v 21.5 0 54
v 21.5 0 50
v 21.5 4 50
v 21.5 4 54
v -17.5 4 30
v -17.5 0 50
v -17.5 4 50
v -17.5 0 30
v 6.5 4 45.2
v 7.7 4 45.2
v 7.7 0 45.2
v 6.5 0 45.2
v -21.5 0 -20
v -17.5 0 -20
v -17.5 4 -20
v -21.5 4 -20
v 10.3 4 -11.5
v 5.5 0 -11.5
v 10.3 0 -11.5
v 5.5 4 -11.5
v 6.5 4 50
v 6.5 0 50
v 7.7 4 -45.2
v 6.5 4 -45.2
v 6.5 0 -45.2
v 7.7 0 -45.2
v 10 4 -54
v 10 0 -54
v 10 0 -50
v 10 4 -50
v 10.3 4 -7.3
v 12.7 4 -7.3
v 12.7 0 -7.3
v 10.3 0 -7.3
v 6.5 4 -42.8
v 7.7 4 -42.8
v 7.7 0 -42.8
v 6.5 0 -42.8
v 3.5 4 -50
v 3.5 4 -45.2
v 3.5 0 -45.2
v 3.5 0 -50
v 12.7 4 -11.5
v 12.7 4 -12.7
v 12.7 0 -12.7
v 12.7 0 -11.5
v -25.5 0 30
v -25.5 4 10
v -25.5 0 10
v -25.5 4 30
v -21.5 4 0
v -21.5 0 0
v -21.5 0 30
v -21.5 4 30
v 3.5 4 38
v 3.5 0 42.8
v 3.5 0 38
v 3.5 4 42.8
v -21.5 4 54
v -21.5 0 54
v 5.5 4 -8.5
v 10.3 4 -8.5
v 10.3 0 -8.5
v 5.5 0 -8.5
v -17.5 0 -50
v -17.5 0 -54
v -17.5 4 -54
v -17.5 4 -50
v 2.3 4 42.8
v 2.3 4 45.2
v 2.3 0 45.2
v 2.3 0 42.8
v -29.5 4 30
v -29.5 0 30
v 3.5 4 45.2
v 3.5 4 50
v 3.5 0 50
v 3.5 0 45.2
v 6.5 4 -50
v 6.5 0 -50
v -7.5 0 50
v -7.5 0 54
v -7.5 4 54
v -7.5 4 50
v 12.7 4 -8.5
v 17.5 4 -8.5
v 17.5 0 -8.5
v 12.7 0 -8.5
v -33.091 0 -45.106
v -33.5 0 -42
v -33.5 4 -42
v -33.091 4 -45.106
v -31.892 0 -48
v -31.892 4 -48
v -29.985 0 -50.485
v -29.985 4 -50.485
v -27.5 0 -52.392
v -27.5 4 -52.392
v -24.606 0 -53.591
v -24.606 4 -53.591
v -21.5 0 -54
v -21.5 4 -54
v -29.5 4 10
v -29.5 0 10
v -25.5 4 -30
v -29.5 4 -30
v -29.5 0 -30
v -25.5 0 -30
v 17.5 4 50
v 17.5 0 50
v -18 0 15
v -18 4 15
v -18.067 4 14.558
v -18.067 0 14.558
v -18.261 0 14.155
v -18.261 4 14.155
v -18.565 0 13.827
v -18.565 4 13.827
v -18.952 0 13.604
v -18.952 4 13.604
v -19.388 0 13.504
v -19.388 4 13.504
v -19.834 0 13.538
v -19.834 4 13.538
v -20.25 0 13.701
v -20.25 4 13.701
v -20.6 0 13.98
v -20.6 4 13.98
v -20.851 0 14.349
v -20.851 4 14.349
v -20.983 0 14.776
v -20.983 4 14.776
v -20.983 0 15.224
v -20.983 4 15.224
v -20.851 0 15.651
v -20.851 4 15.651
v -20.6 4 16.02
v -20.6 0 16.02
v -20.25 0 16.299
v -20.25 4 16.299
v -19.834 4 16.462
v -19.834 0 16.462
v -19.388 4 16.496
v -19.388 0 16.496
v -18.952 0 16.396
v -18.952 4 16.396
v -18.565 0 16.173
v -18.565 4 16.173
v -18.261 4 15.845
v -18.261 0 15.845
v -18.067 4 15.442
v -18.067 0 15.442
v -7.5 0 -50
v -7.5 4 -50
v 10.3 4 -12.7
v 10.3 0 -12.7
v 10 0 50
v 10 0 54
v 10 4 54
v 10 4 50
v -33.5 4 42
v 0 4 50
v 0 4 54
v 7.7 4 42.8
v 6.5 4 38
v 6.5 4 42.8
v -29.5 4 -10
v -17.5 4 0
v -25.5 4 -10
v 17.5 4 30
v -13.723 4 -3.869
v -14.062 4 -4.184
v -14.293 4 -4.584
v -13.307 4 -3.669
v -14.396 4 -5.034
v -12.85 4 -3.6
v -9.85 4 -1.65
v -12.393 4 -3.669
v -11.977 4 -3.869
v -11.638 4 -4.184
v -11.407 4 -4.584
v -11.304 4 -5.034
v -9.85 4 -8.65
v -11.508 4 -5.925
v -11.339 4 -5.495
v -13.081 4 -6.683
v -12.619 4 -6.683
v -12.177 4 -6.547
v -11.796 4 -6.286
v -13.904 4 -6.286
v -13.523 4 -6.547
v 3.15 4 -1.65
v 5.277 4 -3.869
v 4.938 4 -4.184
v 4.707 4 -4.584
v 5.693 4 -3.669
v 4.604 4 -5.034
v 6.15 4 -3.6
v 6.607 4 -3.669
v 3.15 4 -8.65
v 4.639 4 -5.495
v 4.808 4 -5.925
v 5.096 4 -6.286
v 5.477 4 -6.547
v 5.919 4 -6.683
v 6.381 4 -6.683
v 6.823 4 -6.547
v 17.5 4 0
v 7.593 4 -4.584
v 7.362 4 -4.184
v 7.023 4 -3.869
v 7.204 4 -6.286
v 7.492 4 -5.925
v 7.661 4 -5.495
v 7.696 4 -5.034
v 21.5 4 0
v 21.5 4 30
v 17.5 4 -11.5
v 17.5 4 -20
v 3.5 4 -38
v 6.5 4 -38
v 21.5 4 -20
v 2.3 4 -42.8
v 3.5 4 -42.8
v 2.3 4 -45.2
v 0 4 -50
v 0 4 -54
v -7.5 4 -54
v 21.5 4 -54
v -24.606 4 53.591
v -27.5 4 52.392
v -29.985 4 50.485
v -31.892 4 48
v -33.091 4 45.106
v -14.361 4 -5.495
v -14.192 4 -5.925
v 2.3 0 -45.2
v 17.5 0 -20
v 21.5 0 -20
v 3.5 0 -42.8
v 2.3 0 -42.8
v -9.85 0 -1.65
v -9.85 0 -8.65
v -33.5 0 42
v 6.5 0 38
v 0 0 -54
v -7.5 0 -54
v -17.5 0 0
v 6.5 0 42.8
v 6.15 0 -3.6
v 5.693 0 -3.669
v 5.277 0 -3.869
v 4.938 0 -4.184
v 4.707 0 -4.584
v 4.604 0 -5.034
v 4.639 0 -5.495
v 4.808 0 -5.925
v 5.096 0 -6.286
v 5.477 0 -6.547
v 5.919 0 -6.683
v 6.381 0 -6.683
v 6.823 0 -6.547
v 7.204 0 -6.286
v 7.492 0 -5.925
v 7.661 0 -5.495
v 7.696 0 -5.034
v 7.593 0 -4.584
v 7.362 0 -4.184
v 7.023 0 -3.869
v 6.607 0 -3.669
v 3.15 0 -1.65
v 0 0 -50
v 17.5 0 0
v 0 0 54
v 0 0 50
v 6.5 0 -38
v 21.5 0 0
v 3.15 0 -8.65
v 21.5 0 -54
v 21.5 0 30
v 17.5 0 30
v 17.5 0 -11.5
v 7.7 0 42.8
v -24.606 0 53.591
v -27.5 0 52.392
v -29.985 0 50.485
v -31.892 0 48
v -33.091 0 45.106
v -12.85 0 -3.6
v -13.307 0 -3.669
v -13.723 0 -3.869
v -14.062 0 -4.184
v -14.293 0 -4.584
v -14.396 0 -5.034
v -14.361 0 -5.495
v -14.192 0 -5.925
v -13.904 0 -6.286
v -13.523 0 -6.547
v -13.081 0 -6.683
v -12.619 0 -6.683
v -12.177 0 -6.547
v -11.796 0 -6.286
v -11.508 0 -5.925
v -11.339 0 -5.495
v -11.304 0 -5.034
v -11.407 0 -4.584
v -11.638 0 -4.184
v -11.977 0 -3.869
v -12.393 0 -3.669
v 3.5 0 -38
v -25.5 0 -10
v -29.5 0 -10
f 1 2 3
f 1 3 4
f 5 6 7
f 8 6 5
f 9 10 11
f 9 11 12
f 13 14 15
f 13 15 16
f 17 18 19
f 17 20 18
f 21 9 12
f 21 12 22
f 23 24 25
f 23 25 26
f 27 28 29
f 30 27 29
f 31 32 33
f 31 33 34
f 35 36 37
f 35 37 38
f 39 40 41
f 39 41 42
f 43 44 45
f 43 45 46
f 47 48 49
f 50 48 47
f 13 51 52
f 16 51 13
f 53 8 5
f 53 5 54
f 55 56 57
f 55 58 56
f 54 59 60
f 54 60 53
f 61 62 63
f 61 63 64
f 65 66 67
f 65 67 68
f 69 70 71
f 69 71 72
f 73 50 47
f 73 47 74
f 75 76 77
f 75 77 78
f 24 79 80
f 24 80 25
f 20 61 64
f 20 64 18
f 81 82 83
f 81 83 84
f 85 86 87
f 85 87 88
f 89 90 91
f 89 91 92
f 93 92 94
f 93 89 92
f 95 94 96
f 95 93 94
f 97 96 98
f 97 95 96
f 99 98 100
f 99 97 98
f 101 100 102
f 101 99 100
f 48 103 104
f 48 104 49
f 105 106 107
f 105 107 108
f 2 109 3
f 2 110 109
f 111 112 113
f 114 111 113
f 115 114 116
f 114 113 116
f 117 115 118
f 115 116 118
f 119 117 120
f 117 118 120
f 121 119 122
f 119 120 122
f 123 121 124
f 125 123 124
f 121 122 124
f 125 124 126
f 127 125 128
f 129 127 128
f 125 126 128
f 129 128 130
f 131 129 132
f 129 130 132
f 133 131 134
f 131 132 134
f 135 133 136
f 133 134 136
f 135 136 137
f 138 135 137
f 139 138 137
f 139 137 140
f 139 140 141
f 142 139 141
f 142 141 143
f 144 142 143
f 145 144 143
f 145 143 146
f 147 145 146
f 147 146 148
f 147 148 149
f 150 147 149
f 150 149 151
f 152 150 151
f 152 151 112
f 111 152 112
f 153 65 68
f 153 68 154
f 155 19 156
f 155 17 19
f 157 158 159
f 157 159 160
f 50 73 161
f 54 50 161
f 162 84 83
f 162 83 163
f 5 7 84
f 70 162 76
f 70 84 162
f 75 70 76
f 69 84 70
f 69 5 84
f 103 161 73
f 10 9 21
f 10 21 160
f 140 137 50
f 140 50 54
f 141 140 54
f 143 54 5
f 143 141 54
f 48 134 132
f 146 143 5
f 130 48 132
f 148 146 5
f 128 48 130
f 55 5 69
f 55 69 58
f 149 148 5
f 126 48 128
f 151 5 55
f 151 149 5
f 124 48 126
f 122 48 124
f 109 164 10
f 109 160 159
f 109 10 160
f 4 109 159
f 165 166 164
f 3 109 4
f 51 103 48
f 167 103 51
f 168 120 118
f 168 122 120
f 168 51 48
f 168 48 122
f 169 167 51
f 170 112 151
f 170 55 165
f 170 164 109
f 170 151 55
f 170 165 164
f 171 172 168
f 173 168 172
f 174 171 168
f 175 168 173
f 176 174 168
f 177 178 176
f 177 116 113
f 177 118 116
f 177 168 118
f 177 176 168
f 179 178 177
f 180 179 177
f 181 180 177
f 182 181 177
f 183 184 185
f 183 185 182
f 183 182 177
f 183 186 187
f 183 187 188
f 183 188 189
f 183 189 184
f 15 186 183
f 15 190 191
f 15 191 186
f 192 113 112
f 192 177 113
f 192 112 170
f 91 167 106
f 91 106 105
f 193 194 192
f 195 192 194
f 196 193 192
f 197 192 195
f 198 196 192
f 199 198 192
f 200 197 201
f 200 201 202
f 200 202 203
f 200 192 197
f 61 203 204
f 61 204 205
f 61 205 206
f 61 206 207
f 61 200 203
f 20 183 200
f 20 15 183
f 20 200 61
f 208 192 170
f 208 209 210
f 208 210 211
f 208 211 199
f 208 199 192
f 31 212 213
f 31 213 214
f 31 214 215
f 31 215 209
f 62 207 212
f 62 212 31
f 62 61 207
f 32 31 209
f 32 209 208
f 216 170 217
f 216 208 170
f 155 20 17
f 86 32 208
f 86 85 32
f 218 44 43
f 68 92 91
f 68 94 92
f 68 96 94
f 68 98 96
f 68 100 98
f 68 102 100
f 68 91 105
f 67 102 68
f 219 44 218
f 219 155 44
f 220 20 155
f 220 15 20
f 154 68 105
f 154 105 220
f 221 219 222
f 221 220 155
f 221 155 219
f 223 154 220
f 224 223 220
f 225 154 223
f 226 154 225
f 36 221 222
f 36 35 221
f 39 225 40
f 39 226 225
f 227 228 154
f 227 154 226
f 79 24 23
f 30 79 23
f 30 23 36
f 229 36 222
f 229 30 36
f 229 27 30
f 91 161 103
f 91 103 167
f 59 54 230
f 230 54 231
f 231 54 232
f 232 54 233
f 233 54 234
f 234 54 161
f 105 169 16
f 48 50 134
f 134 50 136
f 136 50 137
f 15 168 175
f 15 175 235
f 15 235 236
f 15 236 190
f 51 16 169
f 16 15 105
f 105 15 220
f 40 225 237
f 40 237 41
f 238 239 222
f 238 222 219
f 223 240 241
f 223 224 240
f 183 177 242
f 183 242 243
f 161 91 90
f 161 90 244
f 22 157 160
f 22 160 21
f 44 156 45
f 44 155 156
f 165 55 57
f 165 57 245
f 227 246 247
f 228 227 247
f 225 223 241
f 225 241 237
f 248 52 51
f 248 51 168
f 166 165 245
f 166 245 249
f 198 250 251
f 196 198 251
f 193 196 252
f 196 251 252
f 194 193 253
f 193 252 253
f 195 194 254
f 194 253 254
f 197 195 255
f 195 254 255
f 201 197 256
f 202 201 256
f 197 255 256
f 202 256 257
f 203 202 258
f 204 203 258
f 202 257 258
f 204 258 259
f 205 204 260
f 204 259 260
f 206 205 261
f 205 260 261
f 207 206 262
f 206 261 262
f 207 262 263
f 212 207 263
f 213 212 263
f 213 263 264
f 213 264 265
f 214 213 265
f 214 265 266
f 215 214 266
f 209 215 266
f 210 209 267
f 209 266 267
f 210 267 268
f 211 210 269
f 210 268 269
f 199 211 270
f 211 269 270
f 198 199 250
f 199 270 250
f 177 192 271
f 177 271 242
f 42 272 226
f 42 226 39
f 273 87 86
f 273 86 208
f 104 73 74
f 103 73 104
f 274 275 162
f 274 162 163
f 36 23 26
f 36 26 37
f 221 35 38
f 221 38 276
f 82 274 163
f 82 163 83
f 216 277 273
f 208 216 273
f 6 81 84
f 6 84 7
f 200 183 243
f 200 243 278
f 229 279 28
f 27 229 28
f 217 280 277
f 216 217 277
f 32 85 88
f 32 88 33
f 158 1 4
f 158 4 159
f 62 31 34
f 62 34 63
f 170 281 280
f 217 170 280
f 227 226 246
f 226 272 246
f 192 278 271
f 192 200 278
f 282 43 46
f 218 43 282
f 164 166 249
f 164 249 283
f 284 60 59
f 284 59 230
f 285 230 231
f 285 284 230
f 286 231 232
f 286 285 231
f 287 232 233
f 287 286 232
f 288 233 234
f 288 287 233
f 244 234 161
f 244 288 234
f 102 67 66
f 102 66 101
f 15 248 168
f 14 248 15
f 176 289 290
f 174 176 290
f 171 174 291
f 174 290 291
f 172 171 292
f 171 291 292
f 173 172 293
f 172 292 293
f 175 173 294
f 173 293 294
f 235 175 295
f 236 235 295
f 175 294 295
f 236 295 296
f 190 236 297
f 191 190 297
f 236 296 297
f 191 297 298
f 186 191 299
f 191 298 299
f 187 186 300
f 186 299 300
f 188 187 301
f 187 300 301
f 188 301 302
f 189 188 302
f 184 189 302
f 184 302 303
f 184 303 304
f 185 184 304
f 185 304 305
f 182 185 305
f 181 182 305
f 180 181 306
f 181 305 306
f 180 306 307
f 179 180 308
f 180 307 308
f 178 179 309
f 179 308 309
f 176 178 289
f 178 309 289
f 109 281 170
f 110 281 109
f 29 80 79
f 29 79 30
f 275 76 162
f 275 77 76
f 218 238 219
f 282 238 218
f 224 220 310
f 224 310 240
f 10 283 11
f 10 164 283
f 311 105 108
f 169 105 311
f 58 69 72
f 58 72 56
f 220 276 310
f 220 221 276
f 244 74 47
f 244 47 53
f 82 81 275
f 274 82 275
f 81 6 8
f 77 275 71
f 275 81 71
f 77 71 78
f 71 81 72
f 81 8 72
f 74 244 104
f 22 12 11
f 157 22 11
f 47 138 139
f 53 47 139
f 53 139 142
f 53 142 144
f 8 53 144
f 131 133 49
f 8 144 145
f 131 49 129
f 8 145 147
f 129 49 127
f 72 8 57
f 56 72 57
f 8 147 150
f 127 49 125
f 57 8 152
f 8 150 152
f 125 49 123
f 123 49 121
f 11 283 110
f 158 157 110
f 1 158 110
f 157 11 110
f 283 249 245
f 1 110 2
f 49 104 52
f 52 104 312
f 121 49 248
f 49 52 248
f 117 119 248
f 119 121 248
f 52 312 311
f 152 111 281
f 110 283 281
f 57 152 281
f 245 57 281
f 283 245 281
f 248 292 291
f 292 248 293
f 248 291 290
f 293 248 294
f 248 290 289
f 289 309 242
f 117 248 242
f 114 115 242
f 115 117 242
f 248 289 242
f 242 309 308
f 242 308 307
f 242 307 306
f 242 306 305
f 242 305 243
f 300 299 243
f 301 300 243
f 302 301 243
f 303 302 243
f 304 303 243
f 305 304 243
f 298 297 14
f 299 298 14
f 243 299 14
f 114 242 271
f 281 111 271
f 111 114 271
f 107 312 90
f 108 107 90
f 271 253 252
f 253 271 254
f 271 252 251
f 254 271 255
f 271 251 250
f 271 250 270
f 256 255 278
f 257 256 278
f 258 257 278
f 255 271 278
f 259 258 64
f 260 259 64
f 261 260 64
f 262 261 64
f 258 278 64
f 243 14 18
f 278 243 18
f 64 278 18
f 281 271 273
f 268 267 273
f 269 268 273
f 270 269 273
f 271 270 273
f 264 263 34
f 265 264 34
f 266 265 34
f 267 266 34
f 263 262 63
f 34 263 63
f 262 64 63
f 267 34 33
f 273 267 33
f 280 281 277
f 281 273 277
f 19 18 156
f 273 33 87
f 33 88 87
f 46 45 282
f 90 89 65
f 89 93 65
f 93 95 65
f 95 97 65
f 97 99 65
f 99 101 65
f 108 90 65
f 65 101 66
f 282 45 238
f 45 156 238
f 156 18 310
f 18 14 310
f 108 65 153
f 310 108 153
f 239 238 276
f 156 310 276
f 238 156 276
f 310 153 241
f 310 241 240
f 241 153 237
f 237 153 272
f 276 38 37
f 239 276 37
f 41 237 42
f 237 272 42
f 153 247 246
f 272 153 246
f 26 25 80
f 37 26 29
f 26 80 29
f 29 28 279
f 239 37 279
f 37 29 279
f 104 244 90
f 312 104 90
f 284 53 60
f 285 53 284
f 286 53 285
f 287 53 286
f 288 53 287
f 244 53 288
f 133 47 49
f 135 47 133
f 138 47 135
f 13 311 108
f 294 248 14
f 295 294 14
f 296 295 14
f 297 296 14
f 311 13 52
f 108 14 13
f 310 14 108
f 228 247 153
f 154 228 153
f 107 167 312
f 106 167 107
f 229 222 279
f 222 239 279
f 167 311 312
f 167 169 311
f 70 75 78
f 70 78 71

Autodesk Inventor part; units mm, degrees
ref_plane "YZ Plane" through (0, 0, 0) normal (1, 0, 0) x (0, 1, 0)
ref_plane "XZ Plane" through (0, 0, 0) normal (0, 1, 0) x (-1, 0, 0)
ref_plane "XY Plane" through (0, 0, 0) normal (0, 0, 1) x (1, 0, 0)
sketch "Sketch1" plane through (0, 0, 0) normal (0, 1, 0) x (-1, 0, 0)
  line L0 (-17.5, 50) -> (17.5, 50)
  line L1 (17.5, 50) -> (17.5, -50)
  line L2 (17.5, -50) -> (-17.5, -50)
  line L3 (-17.5, -50) -> (-17.5, 50)
  line L4 (-17.5, 50) -> (17.5, -50) construction
  line L5 (17.5, 50) -> (-17.5, -50) construction
  line L6 (7.5, 50) -> (0, 50)
  line L7 (0, 50) -> (0, 54)
  line L8 (0, 54) -> (7.5, 54)
  line L9 (7.5, 54) -> (7.5, 50)
  line L10 (-10, 50) -> (-21.5, 50)
  line L11 (-21.5, 50) -> (-21.5, 54)
  line L12 (-21.5, 54) -> (-10, 54)
  line L13 (-10, 54) -> (-10, 50)
  line L14 (17.5, 30) -> (21.5, 30)
  line L15 (21.5, 30) -> (21.5, 0)
  line L16 (21.5, 0) -> (17.5, 0)
  line L17 (17.5, 0) -> (17.5, 30)
  line L18 (17.5, -20) -> (21.5, -20)
  line L19 (21.5, -20) -> (21.5, -54)
  line L20 (21.5, -54) -> (17.5, -54)
  line L21 (17.5, -54) -> (17.5, -20)
  line L22 (7.5, -50) -> (0, -50)
  line L23 (0, -50) -> (0, -54)
  line L24 (0, -54) -> (7.5, -54)
  line L25 (7.5, -54) -> (7.5, -50)
  line L26 (-10, -50) -> (-21.5, -50)
  line L27 (-21.5, -50) -> (-21.5, -54)
  line L28 (-21.5, -54) -> (-10, -54)
  line L29 (-10, -54) -> (-10, -50)
  line L30 (-17.5, 30) -> (-21.5, 30)
  line L31 (-21.5, 30) -> (-21.5, 0)
  line L32 (-21.5, 0) -> (-17.5, 0)
  line L33 (-17.5, 0) -> (-17.5, 30)
  line L34 (-17.5, -50) -> (-21.5, -50)
  line L35 (-21.5, -50) -> (-21.5, -20)
  line L36 (-21.5, -20) -> (-17.5, -20)
  line L37 (-17.5, -20) -> (-17.5, -50)
  point P0 (0, 0)
  point P1 (17.5, 0)
  point P2 (-17.5, 0)
  point P3 (-17.5, -20)
  point P4 (-21.5, -50)
  point P5 (0, -50)
  point P6 (17.5, -50)
  dimension "d0" = 35
  dimension "d2" = 7.5
  dimension "d3" = 4
  dimension "d4" = 11.5
  dimension "d5" = 4
  dimension "d6" = 10
  dimension "d7" = 10
  dimension "d8" = 4
  dimension "d9" = 30
  dimension "d10" = 4
  dimension "d11" = 34
  dimension "d12" = 20
  dimension "d13" = 20
  dimension "d14" = 7.5
  dimension "d15" = 4
  dimension "d16" = 11.5
  dimension "d17" = 4
  dimension "d18" = 10
  dimension "d19" = 10
  dimension "d20" = 4
  dimension "d21" = 30
  dimension "d22" = 20
  dimension "d23" = 4
  dimension "d24" = 30
  dimension "d27" = 4
extrude "Extrusion1" add sketch "Sketch1" along normal blind 4
sketch "Sketch2" plane through (0, 4, 0) normal (0, 1, 0) x (1, 0, 0)
  line L0 (-21.5, 54) -> (-33.5, 54)
  line L1 (-33.5, 54) -> (-33.5, -54)
  line L2 (-33.5, -54) -> (-21.5, -54)
  line L3 (-21.5, -54) -> (-21.5, 54)
  line L4 (-7.5, -54) -> (0, -54) projected
  line L5 (-21.5, 54) -> (-21.5, 20) projected
  line L6 (-21.5, 20) -> (-17.5, 20) projected
  line L7 (-17.5, 20) -> (-17.5, 0) projected
  line L8 (-17.5, 0) -> (-21.5, 0) projected
  line L9 (-21.5, 0) -> (-21.5, -30) projected
  line L10 (-21.5, -30) -> (-17.5, -30) projected
  line L11 (-17.5, -30) -> (-17.5, -50) projected
  line L12 (-17.5, -50) -> (-7.5, -50) projected
  line L13 (-7.5, -50) -> (-7.5, -54) projected
  line L14 (-7.5, -54) -> (0, -54) projected
  line L15 (0, -54) -> (0, -50) projected
  line L16 (0, -50) -> (10, -50) projected
  line L17 (10, -50) -> (10, -54) projected
  line L18 (10, -54) -> (21.5, -54) projected
  line L19 (21.5, -54) -> (21.5, -50) projected
  line L20 (21.5, -50) -> (17.5, -50) projected
  line L21 (17.5, -50) -> (17.5, -30) projected
  line L22 (17.5, -30) -> (21.5, -30) projected
  line L23 (21.5, -30) -> (21.5, 0) projected
  line L24 (21.5, 0) -> (17.5, 0) projected
  line L25 (17.5, 0) -> (17.5, 20) projected
  line L26 (17.5, 20) -> (21.5, 20) projected
  line L27 (21.5, 20) -> (21.5, 54) projected
  line L28 (21.5, 54) -> (10, 54) projected
  line L29 (10, 54) -> (10, 50) projected
  line L30 (10, 50) -> (0, 50) projected
  line L31 (0, 50) -> (0, 54) projected
  line L32 (0, 54) -> (-7.5, 54) projected
  line L33 (-7.5, 54) -> (-7.5, 50) projected
  line L34 (-7.5, 50) -> (-17.5, 50) projected
  line L35 (-17.5, 50) -> (-17.5, 54) projected
  line L36 (-17.5, 54) -> (-21.5, 54) projected
  line L37 (-29.5, 30) -> (-25.5, 30)
  line L38 (-25.5, 30) -> (-25.5, 10)
  line L39 (-25.5, 10) -> (-29.5, 10)
  line L40 (-29.5, 10) -> (-29.5, 30)
  line L41 (-25.5, -30) -> (-29.5, -30)
  line L42 (-29.5, -30) -> (-29.5, -10)
  line L43 (-29.5, -10) -> (-25.5, -10)
  line L44 (-25.5, -10) -> (-25.5, -30)
  line L45 (-29.5, 10) -> (-25.5, -10) construction
  point P0 (0, 0)
  point P1 (-27.5, 0)
  point P2 (-33.5, 0)
  dimension "d29" = 4
  dimension "d30" = 20
  dimension "d31" = 20
  dimension "d32" = 4
  dimension "d35" = 51
extrude "Extrusion2" add sketch "Sketch2" against normal up to surface (4 mm away) contours L3 L2 L1 L0
sketch "Sketch3" plane through (0, 4, 0) normal (0, 1, 0) x (1, 0, 0)
  line L0 (-1.8, 2) -> (-1.8, 8.3) construction
  line L1 (17.5, 0) -> (17.5, 20) projected
  line L2 (-21.5, -30) -> (-17.5, -30) projected
  line L3 (-17.5, -30) -> (-17.5, -50) projected
  line L4 (-17.5, -50) -> (-7.5, -50) projected
  line L5 (-7.5, -50) -> (-7.5, -54) projected
  line L6 (-7.5, -54) -> (0, -54) projected
  line L7 (0, -54) -> (0, -50) projected
  line L8 (0, -50) -> (10, -50) projected
  line L9 (10, -50) -> (10, -54) projected
  line L10 (10, -54) -> (21.5, -54) projected
  line L11 (21.5, -54) -> (21.5, -50) projected
  line L12 (21.5, -50) -> (17.5, -50) projected
  line L13 (17.5, -50) -> (17.5, -30) projected
  line L14 (17.5, -30) -> (21.5, -30) projected
  line L15 (21.5, -30) -> (21.5, 0) projected
  line L16 (21.5, 0) -> (17.5, 0) projected
  line L17 (17.5, 0) -> (17.5, 20) projected
  line L18 (17.5, 20) -> (21.5, 20) projected
  line L19 (21.5, 20) -> (21.5, 54) projected
  line L20 (21.5, 54) -> (10, 54) projected
  line L21 (10, 54) -> (10, 50) projected
  line L22 (10, 50) -> (0, 50) projected
  line L23 (0, 50) -> (0, 54) projected
  line L24 (0, 54) -> (-7.5, 54) projected
  line L25 (-7.5, 54) -> (-7.5, 50) projected
  line L26 (-7.5, 50) -> (-17.5, 50) projected
  line L27 (-17.5, 50) -> (-17.5, 54) projected
  line L28 (-17.5, 54) -> (-33.5, 54) projected
  line L29 (-33.5, 54) -> (-33.5, -54) projected
  line L30 (-33.5, -54) -> (-21.5, -54) projected
  line L31 (-21.5, -54) -> (-21.5, -30) projected
  line L32 (-25.5, -30) -> (-29.5, -30) projected
  line L33 (-29.5, -30) -> (-29.5, -10) projected
  line L34 (-29.5, -10) -> (-25.5, -10) projected
  line L35 (-25.5, -10) -> (-25.5, -30) projected
  line L36 (-29.5, 30) -> (-25.5, 30) projected
  line L37 (-25.5, 30) -> (-25.5, 10) projected
  line L38 (-25.5, 10) -> (-29.5, 10) projected
  line L39 (-29.5, 10) -> (-29.5, 30) projected
  line L40 (-21.5, 0) -> (-21.5, 20) projected
  line L41 (-21.5, 20) -> (-17.5, 20) projected
  line L42 (-17.5, 20) -> (-17.5, 0) projected
  line L43 (-17.5, 0) -> (-21.5, 0) projected
  line L44 (-25.5, 10) -> (-29.5, 10) projected
  line L45 (-25.5, -30) -> (-25.5, -10) projected
  line L46 (-29.5, 10) -> (-25.5, -10) construction
  point P0 (0, 0)
  point P1 (-27.5, 0)
  point P2 (6.15, 5.15)
  point P3 (-12.85, 5.15)
  point P4 (-1.8, 5.15)
  dimension "d36" = 19.3
  dimension "d37" = 6.3
  dimension "d38" = 2
  dimension "d39" = 7.95
  dimension "d40" = 11.05
hole "Hole1" at (-12.85, 4, -5.15) at (6.15, 4, -5.15) direction (0, -1, 0) diameter 3.1 depth 4
sketch "Sketch4" plane through (0, 4, 0) normal (0, 1, 0) x (1, 0, 0)
  circle A0 centre (-12.85, 5.15) radius 1.55 projected
  circle A1 centre (6.15, 5.15) radius 1.55 projected
  line L0 (-21.5, -30) -> (-17.5, -30) projected
  line L1 (-17.5, -30) -> (-17.5, -50) projected
  line L2 (-17.5, -50) -> (-7.5, -50) projected
  line L3 (-7.5, -50) -> (-7.5, -54) projected
  line L4 (-7.5, -54) -> (0, -54) projected
  line L5 (0, -54) -> (0, -50) projected
  line L6 (0, -50) -> (10, -50) projected
  line L7 (10, -50) -> (10, -54) projected
  line L8 (10, -54) -> (21.5, -54) projected
  line L9 (21.5, -54) -> (21.5, -50) projected
  line L10 (21.5, -50) -> (17.5, -50) projected
  line L11 (17.5, -50) -> (17.5, -30) projected
  line L12 (17.5, -30) -> (21.5, -30) projected
  line L13 (21.5, -30) -> (21.5, 0) projected
  line L14 (21.5, 0) -> (17.5, 0) projected
  line L15 (17.5, 0) -> (17.5, 20) projected
  line L16 (17.5, 20) -> (21.5, 20) projected
  line L17 (21.5, 20) -> (21.5, 54) projected
  line L18 (21.5, 54) -> (10, 54) projected
  line L19 (10, 54) -> (10, 50) projected
  line L20 (10, 50) -> (0, 50) projected
  line L21 (0, 50) -> (0, 54) projected
  line L22 (0, 54) -> (-7.5, 54) projected
  line L23 (-7.5, 54) -> (-7.5, 50) projected
  line L24 (-7.5, 50) -> (-17.5, 50) projected
  line L25 (-17.5, 50) -> (-17.5, 54) projected
  line L26 (-17.5, 54) -> (-33.5, 54) projected
  line L27 (-33.5, 54) -> (-33.5, -54) projected
  line L28 (-33.5, -54) -> (-21.5, -54) projected
  line L29 (-21.5, -54) -> (-21.5, -30) projected
  line L30 (-25.5, -30) -> (-29.5, -30) projected
  line L31 (-29.5, -30) -> (-29.5, -10) projected
  line L32 (-29.5, -10) -> (-25.5, -10) projected
  line L33 (-25.5, -10) -> (-25.5, -30) projected
  line L34 (-29.5, 30) -> (-25.5, 30) projected
  line L35 (-25.5, 30) -> (-25.5, 10) projected
  line L36 (-25.5, 10) -> (-29.5, 10) projected
  line L37 (-29.5, 10) -> (-29.5, 30) projected
  line L38 (-21.5, 0) -> (-21.5, 20) projected
  line L39 (-21.5, 20) -> (-17.5, 20) projected
  line L40 (-17.5, 20) -> (-17.5, 0) projected
  line L41 (-17.5, 0) -> (-21.5, 0) projected
  line L42 (-9.85, 8.65) -> (3.15, 8.65)
  line L43 (3.15, 8.65) -> (3.15, 1.65)
  line L44 (3.15, 1.65) -> (-9.85, 1.65)
  line L45 (-9.85, 1.65) -> (-9.85, 8.65)
  line L46 (-12.85, 5.15) -> (-9.85, 5.15) construction
  line L47 (3.15, 5.15) -> (6.15, 5.15) construction
  point P0 (0, 0)
  dimension "d49" = 7
  dimension "d54" = 3
extrude "Extrusion3" cut sketch "Sketch4" against normal through all contours L42 L43 L44 L45
sketch "Sketch5" plane through (0, 4, 0) normal (0, 1, 0) x (1, 0, 0)
  line L0 (12.7, 11.5) -> (17.5, 11.5) projected
  line L1 (17.5, 11.5) -> (17.5, 20) construction
  line L2 (17.5, 20) -> (21.5, 20) construction
  line L3 (21.5, 20) -> (21.5, 54) construction
  line L4 (21.5, 54) -> (10, 54) construction
  line L5 (10, 54) -> (10, 50) construction
  line L6 (10, 50) -> (6.5, 50) construction
  line L7 (6.5, 50) -> (6.5, 45.2) projected
  line L8 (6.5, 45.2) -> (7.7, 45.2) projected
  line L9 (7.7, 45.2) -> (7.7, 42.8) projected
  line L10 (7.7, 42.8) -> (6.5, 42.8) projected
  line L11 (6.5, 42.8) -> (6.5, 38) projected
  line L12 (6.5, 38) -> (3.5, 38) projected
  line L13 (3.5, 38) -> (3.5, 42.8) projected
  line L14 (3.5, 42.8) -> (2.3, 42.8) projected
  line L15 (2.3, 42.8) -> (2.3, 45.2) projected
  line L16 (2.3, 45.2) -> (3.5, 45.2) projected
  line L17 (3.5, 45.2) -> (3.5, 50) projected
  line L18 (3.5, 50) -> (0, 50) construction
  line L19 (0, 50) -> (0, 54) construction
  line L20 (0, 54) -> (-7.5, 54) construction
  line L21 (-7.5, 54) -> (-7.5, 50) construction
  line L22 (-7.5, 50) -> (-17.5, 50) construction
  line L23 (-17.5, 50) -> (-17.5, 54) construction
  line L24 (-17.5, 54) -> (-33.5, 54) construction
  line L25 (-33.5, 54) -> (-33.5, -54) construction
  line L26 (-33.5, -54) -> (-21.5, -54) construction
  line L27 (-21.5, -54) -> (-21.5, -30) construction
  line L28 (-21.5, -30) -> (-17.5, -30) construction
  line L29 (-17.5, -30) -> (-17.5, -50) construction
  line L30 (-17.5, -50) -> (-7.5, -50) construction
  line L31 (-7.5, -50) -> (-7.5, -54) construction
  line L32 (-7.5, -54) -> (0, -54) construction
  line L33 (0, -54) -> (0, -50) projected
  line L34 (0, -50) -> (3.5, -50) projected
  line L35 (3.5, -50) -> (3.5, -45.2) projected
  line L36 (3.5, -45.2) -> (2.3, -45.2) projected
  line L37 (2.3, -45.2) -> (2.3, -42.8) projected
  line L38 (2.3, -42.8) -> (3.5, -42.8) projected
  line L39 (3.5, -42.8) -> (3.5, -38) projected
  line L40 (3.5, -38) -> (6.5, -38) projected
  line L41 (6.5, -38) -> (6.5, -42.8) projected
  line L42 (6.5, -42.8) -> (7.7, -42.8) projected
  line L43 (7.7, -42.8) -> (7.7, -45.2) projected
  line L44 (7.7, -45.2) -> (6.5, -45.2) projected
  line L45 (6.5, -45.2) -> (6.5, -50) projected
  line L46 (6.5, -50) -> (10, -50) construction
  line L47 (10, -50) -> (10, -54) construction
  line L48 (10, -54) -> (21.5, -54) construction
  line L49 (21.5, -54) -> (21.5, -50) construction
  line L50 (21.5, -50) -> (17.5, -50) construction
  line L51 (17.5, -50) -> (17.5, -30) construction
  line L52 (17.5, -30) -> (21.5, -30) construction
  line L53 (21.5, 0) -> (17.5, 0) construction
  line L54 (17.5, 0) -> (17.5, 8.5) construction
  line L55 (17.5, 8.5) -> (12.7, 8.5) projected
  line L56 (12.7, 8.5) -> (12.7, 7.3) projected
  line L57 (12.7, 7.3) -> (10.3, 7.3) projected
  line L58 (10.3, 7.3) -> (10.3, 8.5) projected
  line L59 (10.3, 8.5) -> (5.5, 8.5) projected
  line L60 (5.5, 8.5) -> (5.5, 11.5) projected
  line L61 (5.5, 11.5) -> (10.3, 11.5) projected
  line L62 (10.3, 11.5) -> (10.3, 12.7) projected
  line L63 (10.3, 12.7) -> (12.7, 12.7) projected
  line L64 (12.7, 12.7) -> (12.7, 11.5) projected
  circle A0 centre (-19.5, -15) radius 1.5 projected
  line L65 (-29.5, 10) -> (-25.5, 10) construction
  line L66 (-25.5, 10) -> (-25.5, -10) construction
  line L67 (-25.5, -10) -> (-29.5, -10) construction
  line L68 (-29.5, -10) -> (-29.5, 10) construction
  line L69 (-21.5, 0) -> (-21.5, 20) construction
  line L70 (-21.5, 20) -> (-17.5, 20) construction
  line L71 (-17.5, 20) -> (-17.5, 0) construction
  line L72 (-17.5, 0) -> (-21.5, 0) construction
  line L73 (3.5, 50) -> (6.5, 50)
  line L74 (10, 50) -> (0, 50) projected
  line L75 (17.5, 11.5) -> (17.5, 8.5)
  line L76 (3.5, -50) -> (6.5, -50)
  line L77 (0, -50) -> (10, -50) projected
  point P0 (0, 0)
extrude "Extrusion4" cut sketch "Sketch5" against normal up to next
fillet "Fillet1" radius 12 2 edges at (-33.5, 2, 54) (-33.5, 2, -54)
properties part number "FloorButtonHolder_Top_V1_B" material "MDF Medium Density Fiberboard"
